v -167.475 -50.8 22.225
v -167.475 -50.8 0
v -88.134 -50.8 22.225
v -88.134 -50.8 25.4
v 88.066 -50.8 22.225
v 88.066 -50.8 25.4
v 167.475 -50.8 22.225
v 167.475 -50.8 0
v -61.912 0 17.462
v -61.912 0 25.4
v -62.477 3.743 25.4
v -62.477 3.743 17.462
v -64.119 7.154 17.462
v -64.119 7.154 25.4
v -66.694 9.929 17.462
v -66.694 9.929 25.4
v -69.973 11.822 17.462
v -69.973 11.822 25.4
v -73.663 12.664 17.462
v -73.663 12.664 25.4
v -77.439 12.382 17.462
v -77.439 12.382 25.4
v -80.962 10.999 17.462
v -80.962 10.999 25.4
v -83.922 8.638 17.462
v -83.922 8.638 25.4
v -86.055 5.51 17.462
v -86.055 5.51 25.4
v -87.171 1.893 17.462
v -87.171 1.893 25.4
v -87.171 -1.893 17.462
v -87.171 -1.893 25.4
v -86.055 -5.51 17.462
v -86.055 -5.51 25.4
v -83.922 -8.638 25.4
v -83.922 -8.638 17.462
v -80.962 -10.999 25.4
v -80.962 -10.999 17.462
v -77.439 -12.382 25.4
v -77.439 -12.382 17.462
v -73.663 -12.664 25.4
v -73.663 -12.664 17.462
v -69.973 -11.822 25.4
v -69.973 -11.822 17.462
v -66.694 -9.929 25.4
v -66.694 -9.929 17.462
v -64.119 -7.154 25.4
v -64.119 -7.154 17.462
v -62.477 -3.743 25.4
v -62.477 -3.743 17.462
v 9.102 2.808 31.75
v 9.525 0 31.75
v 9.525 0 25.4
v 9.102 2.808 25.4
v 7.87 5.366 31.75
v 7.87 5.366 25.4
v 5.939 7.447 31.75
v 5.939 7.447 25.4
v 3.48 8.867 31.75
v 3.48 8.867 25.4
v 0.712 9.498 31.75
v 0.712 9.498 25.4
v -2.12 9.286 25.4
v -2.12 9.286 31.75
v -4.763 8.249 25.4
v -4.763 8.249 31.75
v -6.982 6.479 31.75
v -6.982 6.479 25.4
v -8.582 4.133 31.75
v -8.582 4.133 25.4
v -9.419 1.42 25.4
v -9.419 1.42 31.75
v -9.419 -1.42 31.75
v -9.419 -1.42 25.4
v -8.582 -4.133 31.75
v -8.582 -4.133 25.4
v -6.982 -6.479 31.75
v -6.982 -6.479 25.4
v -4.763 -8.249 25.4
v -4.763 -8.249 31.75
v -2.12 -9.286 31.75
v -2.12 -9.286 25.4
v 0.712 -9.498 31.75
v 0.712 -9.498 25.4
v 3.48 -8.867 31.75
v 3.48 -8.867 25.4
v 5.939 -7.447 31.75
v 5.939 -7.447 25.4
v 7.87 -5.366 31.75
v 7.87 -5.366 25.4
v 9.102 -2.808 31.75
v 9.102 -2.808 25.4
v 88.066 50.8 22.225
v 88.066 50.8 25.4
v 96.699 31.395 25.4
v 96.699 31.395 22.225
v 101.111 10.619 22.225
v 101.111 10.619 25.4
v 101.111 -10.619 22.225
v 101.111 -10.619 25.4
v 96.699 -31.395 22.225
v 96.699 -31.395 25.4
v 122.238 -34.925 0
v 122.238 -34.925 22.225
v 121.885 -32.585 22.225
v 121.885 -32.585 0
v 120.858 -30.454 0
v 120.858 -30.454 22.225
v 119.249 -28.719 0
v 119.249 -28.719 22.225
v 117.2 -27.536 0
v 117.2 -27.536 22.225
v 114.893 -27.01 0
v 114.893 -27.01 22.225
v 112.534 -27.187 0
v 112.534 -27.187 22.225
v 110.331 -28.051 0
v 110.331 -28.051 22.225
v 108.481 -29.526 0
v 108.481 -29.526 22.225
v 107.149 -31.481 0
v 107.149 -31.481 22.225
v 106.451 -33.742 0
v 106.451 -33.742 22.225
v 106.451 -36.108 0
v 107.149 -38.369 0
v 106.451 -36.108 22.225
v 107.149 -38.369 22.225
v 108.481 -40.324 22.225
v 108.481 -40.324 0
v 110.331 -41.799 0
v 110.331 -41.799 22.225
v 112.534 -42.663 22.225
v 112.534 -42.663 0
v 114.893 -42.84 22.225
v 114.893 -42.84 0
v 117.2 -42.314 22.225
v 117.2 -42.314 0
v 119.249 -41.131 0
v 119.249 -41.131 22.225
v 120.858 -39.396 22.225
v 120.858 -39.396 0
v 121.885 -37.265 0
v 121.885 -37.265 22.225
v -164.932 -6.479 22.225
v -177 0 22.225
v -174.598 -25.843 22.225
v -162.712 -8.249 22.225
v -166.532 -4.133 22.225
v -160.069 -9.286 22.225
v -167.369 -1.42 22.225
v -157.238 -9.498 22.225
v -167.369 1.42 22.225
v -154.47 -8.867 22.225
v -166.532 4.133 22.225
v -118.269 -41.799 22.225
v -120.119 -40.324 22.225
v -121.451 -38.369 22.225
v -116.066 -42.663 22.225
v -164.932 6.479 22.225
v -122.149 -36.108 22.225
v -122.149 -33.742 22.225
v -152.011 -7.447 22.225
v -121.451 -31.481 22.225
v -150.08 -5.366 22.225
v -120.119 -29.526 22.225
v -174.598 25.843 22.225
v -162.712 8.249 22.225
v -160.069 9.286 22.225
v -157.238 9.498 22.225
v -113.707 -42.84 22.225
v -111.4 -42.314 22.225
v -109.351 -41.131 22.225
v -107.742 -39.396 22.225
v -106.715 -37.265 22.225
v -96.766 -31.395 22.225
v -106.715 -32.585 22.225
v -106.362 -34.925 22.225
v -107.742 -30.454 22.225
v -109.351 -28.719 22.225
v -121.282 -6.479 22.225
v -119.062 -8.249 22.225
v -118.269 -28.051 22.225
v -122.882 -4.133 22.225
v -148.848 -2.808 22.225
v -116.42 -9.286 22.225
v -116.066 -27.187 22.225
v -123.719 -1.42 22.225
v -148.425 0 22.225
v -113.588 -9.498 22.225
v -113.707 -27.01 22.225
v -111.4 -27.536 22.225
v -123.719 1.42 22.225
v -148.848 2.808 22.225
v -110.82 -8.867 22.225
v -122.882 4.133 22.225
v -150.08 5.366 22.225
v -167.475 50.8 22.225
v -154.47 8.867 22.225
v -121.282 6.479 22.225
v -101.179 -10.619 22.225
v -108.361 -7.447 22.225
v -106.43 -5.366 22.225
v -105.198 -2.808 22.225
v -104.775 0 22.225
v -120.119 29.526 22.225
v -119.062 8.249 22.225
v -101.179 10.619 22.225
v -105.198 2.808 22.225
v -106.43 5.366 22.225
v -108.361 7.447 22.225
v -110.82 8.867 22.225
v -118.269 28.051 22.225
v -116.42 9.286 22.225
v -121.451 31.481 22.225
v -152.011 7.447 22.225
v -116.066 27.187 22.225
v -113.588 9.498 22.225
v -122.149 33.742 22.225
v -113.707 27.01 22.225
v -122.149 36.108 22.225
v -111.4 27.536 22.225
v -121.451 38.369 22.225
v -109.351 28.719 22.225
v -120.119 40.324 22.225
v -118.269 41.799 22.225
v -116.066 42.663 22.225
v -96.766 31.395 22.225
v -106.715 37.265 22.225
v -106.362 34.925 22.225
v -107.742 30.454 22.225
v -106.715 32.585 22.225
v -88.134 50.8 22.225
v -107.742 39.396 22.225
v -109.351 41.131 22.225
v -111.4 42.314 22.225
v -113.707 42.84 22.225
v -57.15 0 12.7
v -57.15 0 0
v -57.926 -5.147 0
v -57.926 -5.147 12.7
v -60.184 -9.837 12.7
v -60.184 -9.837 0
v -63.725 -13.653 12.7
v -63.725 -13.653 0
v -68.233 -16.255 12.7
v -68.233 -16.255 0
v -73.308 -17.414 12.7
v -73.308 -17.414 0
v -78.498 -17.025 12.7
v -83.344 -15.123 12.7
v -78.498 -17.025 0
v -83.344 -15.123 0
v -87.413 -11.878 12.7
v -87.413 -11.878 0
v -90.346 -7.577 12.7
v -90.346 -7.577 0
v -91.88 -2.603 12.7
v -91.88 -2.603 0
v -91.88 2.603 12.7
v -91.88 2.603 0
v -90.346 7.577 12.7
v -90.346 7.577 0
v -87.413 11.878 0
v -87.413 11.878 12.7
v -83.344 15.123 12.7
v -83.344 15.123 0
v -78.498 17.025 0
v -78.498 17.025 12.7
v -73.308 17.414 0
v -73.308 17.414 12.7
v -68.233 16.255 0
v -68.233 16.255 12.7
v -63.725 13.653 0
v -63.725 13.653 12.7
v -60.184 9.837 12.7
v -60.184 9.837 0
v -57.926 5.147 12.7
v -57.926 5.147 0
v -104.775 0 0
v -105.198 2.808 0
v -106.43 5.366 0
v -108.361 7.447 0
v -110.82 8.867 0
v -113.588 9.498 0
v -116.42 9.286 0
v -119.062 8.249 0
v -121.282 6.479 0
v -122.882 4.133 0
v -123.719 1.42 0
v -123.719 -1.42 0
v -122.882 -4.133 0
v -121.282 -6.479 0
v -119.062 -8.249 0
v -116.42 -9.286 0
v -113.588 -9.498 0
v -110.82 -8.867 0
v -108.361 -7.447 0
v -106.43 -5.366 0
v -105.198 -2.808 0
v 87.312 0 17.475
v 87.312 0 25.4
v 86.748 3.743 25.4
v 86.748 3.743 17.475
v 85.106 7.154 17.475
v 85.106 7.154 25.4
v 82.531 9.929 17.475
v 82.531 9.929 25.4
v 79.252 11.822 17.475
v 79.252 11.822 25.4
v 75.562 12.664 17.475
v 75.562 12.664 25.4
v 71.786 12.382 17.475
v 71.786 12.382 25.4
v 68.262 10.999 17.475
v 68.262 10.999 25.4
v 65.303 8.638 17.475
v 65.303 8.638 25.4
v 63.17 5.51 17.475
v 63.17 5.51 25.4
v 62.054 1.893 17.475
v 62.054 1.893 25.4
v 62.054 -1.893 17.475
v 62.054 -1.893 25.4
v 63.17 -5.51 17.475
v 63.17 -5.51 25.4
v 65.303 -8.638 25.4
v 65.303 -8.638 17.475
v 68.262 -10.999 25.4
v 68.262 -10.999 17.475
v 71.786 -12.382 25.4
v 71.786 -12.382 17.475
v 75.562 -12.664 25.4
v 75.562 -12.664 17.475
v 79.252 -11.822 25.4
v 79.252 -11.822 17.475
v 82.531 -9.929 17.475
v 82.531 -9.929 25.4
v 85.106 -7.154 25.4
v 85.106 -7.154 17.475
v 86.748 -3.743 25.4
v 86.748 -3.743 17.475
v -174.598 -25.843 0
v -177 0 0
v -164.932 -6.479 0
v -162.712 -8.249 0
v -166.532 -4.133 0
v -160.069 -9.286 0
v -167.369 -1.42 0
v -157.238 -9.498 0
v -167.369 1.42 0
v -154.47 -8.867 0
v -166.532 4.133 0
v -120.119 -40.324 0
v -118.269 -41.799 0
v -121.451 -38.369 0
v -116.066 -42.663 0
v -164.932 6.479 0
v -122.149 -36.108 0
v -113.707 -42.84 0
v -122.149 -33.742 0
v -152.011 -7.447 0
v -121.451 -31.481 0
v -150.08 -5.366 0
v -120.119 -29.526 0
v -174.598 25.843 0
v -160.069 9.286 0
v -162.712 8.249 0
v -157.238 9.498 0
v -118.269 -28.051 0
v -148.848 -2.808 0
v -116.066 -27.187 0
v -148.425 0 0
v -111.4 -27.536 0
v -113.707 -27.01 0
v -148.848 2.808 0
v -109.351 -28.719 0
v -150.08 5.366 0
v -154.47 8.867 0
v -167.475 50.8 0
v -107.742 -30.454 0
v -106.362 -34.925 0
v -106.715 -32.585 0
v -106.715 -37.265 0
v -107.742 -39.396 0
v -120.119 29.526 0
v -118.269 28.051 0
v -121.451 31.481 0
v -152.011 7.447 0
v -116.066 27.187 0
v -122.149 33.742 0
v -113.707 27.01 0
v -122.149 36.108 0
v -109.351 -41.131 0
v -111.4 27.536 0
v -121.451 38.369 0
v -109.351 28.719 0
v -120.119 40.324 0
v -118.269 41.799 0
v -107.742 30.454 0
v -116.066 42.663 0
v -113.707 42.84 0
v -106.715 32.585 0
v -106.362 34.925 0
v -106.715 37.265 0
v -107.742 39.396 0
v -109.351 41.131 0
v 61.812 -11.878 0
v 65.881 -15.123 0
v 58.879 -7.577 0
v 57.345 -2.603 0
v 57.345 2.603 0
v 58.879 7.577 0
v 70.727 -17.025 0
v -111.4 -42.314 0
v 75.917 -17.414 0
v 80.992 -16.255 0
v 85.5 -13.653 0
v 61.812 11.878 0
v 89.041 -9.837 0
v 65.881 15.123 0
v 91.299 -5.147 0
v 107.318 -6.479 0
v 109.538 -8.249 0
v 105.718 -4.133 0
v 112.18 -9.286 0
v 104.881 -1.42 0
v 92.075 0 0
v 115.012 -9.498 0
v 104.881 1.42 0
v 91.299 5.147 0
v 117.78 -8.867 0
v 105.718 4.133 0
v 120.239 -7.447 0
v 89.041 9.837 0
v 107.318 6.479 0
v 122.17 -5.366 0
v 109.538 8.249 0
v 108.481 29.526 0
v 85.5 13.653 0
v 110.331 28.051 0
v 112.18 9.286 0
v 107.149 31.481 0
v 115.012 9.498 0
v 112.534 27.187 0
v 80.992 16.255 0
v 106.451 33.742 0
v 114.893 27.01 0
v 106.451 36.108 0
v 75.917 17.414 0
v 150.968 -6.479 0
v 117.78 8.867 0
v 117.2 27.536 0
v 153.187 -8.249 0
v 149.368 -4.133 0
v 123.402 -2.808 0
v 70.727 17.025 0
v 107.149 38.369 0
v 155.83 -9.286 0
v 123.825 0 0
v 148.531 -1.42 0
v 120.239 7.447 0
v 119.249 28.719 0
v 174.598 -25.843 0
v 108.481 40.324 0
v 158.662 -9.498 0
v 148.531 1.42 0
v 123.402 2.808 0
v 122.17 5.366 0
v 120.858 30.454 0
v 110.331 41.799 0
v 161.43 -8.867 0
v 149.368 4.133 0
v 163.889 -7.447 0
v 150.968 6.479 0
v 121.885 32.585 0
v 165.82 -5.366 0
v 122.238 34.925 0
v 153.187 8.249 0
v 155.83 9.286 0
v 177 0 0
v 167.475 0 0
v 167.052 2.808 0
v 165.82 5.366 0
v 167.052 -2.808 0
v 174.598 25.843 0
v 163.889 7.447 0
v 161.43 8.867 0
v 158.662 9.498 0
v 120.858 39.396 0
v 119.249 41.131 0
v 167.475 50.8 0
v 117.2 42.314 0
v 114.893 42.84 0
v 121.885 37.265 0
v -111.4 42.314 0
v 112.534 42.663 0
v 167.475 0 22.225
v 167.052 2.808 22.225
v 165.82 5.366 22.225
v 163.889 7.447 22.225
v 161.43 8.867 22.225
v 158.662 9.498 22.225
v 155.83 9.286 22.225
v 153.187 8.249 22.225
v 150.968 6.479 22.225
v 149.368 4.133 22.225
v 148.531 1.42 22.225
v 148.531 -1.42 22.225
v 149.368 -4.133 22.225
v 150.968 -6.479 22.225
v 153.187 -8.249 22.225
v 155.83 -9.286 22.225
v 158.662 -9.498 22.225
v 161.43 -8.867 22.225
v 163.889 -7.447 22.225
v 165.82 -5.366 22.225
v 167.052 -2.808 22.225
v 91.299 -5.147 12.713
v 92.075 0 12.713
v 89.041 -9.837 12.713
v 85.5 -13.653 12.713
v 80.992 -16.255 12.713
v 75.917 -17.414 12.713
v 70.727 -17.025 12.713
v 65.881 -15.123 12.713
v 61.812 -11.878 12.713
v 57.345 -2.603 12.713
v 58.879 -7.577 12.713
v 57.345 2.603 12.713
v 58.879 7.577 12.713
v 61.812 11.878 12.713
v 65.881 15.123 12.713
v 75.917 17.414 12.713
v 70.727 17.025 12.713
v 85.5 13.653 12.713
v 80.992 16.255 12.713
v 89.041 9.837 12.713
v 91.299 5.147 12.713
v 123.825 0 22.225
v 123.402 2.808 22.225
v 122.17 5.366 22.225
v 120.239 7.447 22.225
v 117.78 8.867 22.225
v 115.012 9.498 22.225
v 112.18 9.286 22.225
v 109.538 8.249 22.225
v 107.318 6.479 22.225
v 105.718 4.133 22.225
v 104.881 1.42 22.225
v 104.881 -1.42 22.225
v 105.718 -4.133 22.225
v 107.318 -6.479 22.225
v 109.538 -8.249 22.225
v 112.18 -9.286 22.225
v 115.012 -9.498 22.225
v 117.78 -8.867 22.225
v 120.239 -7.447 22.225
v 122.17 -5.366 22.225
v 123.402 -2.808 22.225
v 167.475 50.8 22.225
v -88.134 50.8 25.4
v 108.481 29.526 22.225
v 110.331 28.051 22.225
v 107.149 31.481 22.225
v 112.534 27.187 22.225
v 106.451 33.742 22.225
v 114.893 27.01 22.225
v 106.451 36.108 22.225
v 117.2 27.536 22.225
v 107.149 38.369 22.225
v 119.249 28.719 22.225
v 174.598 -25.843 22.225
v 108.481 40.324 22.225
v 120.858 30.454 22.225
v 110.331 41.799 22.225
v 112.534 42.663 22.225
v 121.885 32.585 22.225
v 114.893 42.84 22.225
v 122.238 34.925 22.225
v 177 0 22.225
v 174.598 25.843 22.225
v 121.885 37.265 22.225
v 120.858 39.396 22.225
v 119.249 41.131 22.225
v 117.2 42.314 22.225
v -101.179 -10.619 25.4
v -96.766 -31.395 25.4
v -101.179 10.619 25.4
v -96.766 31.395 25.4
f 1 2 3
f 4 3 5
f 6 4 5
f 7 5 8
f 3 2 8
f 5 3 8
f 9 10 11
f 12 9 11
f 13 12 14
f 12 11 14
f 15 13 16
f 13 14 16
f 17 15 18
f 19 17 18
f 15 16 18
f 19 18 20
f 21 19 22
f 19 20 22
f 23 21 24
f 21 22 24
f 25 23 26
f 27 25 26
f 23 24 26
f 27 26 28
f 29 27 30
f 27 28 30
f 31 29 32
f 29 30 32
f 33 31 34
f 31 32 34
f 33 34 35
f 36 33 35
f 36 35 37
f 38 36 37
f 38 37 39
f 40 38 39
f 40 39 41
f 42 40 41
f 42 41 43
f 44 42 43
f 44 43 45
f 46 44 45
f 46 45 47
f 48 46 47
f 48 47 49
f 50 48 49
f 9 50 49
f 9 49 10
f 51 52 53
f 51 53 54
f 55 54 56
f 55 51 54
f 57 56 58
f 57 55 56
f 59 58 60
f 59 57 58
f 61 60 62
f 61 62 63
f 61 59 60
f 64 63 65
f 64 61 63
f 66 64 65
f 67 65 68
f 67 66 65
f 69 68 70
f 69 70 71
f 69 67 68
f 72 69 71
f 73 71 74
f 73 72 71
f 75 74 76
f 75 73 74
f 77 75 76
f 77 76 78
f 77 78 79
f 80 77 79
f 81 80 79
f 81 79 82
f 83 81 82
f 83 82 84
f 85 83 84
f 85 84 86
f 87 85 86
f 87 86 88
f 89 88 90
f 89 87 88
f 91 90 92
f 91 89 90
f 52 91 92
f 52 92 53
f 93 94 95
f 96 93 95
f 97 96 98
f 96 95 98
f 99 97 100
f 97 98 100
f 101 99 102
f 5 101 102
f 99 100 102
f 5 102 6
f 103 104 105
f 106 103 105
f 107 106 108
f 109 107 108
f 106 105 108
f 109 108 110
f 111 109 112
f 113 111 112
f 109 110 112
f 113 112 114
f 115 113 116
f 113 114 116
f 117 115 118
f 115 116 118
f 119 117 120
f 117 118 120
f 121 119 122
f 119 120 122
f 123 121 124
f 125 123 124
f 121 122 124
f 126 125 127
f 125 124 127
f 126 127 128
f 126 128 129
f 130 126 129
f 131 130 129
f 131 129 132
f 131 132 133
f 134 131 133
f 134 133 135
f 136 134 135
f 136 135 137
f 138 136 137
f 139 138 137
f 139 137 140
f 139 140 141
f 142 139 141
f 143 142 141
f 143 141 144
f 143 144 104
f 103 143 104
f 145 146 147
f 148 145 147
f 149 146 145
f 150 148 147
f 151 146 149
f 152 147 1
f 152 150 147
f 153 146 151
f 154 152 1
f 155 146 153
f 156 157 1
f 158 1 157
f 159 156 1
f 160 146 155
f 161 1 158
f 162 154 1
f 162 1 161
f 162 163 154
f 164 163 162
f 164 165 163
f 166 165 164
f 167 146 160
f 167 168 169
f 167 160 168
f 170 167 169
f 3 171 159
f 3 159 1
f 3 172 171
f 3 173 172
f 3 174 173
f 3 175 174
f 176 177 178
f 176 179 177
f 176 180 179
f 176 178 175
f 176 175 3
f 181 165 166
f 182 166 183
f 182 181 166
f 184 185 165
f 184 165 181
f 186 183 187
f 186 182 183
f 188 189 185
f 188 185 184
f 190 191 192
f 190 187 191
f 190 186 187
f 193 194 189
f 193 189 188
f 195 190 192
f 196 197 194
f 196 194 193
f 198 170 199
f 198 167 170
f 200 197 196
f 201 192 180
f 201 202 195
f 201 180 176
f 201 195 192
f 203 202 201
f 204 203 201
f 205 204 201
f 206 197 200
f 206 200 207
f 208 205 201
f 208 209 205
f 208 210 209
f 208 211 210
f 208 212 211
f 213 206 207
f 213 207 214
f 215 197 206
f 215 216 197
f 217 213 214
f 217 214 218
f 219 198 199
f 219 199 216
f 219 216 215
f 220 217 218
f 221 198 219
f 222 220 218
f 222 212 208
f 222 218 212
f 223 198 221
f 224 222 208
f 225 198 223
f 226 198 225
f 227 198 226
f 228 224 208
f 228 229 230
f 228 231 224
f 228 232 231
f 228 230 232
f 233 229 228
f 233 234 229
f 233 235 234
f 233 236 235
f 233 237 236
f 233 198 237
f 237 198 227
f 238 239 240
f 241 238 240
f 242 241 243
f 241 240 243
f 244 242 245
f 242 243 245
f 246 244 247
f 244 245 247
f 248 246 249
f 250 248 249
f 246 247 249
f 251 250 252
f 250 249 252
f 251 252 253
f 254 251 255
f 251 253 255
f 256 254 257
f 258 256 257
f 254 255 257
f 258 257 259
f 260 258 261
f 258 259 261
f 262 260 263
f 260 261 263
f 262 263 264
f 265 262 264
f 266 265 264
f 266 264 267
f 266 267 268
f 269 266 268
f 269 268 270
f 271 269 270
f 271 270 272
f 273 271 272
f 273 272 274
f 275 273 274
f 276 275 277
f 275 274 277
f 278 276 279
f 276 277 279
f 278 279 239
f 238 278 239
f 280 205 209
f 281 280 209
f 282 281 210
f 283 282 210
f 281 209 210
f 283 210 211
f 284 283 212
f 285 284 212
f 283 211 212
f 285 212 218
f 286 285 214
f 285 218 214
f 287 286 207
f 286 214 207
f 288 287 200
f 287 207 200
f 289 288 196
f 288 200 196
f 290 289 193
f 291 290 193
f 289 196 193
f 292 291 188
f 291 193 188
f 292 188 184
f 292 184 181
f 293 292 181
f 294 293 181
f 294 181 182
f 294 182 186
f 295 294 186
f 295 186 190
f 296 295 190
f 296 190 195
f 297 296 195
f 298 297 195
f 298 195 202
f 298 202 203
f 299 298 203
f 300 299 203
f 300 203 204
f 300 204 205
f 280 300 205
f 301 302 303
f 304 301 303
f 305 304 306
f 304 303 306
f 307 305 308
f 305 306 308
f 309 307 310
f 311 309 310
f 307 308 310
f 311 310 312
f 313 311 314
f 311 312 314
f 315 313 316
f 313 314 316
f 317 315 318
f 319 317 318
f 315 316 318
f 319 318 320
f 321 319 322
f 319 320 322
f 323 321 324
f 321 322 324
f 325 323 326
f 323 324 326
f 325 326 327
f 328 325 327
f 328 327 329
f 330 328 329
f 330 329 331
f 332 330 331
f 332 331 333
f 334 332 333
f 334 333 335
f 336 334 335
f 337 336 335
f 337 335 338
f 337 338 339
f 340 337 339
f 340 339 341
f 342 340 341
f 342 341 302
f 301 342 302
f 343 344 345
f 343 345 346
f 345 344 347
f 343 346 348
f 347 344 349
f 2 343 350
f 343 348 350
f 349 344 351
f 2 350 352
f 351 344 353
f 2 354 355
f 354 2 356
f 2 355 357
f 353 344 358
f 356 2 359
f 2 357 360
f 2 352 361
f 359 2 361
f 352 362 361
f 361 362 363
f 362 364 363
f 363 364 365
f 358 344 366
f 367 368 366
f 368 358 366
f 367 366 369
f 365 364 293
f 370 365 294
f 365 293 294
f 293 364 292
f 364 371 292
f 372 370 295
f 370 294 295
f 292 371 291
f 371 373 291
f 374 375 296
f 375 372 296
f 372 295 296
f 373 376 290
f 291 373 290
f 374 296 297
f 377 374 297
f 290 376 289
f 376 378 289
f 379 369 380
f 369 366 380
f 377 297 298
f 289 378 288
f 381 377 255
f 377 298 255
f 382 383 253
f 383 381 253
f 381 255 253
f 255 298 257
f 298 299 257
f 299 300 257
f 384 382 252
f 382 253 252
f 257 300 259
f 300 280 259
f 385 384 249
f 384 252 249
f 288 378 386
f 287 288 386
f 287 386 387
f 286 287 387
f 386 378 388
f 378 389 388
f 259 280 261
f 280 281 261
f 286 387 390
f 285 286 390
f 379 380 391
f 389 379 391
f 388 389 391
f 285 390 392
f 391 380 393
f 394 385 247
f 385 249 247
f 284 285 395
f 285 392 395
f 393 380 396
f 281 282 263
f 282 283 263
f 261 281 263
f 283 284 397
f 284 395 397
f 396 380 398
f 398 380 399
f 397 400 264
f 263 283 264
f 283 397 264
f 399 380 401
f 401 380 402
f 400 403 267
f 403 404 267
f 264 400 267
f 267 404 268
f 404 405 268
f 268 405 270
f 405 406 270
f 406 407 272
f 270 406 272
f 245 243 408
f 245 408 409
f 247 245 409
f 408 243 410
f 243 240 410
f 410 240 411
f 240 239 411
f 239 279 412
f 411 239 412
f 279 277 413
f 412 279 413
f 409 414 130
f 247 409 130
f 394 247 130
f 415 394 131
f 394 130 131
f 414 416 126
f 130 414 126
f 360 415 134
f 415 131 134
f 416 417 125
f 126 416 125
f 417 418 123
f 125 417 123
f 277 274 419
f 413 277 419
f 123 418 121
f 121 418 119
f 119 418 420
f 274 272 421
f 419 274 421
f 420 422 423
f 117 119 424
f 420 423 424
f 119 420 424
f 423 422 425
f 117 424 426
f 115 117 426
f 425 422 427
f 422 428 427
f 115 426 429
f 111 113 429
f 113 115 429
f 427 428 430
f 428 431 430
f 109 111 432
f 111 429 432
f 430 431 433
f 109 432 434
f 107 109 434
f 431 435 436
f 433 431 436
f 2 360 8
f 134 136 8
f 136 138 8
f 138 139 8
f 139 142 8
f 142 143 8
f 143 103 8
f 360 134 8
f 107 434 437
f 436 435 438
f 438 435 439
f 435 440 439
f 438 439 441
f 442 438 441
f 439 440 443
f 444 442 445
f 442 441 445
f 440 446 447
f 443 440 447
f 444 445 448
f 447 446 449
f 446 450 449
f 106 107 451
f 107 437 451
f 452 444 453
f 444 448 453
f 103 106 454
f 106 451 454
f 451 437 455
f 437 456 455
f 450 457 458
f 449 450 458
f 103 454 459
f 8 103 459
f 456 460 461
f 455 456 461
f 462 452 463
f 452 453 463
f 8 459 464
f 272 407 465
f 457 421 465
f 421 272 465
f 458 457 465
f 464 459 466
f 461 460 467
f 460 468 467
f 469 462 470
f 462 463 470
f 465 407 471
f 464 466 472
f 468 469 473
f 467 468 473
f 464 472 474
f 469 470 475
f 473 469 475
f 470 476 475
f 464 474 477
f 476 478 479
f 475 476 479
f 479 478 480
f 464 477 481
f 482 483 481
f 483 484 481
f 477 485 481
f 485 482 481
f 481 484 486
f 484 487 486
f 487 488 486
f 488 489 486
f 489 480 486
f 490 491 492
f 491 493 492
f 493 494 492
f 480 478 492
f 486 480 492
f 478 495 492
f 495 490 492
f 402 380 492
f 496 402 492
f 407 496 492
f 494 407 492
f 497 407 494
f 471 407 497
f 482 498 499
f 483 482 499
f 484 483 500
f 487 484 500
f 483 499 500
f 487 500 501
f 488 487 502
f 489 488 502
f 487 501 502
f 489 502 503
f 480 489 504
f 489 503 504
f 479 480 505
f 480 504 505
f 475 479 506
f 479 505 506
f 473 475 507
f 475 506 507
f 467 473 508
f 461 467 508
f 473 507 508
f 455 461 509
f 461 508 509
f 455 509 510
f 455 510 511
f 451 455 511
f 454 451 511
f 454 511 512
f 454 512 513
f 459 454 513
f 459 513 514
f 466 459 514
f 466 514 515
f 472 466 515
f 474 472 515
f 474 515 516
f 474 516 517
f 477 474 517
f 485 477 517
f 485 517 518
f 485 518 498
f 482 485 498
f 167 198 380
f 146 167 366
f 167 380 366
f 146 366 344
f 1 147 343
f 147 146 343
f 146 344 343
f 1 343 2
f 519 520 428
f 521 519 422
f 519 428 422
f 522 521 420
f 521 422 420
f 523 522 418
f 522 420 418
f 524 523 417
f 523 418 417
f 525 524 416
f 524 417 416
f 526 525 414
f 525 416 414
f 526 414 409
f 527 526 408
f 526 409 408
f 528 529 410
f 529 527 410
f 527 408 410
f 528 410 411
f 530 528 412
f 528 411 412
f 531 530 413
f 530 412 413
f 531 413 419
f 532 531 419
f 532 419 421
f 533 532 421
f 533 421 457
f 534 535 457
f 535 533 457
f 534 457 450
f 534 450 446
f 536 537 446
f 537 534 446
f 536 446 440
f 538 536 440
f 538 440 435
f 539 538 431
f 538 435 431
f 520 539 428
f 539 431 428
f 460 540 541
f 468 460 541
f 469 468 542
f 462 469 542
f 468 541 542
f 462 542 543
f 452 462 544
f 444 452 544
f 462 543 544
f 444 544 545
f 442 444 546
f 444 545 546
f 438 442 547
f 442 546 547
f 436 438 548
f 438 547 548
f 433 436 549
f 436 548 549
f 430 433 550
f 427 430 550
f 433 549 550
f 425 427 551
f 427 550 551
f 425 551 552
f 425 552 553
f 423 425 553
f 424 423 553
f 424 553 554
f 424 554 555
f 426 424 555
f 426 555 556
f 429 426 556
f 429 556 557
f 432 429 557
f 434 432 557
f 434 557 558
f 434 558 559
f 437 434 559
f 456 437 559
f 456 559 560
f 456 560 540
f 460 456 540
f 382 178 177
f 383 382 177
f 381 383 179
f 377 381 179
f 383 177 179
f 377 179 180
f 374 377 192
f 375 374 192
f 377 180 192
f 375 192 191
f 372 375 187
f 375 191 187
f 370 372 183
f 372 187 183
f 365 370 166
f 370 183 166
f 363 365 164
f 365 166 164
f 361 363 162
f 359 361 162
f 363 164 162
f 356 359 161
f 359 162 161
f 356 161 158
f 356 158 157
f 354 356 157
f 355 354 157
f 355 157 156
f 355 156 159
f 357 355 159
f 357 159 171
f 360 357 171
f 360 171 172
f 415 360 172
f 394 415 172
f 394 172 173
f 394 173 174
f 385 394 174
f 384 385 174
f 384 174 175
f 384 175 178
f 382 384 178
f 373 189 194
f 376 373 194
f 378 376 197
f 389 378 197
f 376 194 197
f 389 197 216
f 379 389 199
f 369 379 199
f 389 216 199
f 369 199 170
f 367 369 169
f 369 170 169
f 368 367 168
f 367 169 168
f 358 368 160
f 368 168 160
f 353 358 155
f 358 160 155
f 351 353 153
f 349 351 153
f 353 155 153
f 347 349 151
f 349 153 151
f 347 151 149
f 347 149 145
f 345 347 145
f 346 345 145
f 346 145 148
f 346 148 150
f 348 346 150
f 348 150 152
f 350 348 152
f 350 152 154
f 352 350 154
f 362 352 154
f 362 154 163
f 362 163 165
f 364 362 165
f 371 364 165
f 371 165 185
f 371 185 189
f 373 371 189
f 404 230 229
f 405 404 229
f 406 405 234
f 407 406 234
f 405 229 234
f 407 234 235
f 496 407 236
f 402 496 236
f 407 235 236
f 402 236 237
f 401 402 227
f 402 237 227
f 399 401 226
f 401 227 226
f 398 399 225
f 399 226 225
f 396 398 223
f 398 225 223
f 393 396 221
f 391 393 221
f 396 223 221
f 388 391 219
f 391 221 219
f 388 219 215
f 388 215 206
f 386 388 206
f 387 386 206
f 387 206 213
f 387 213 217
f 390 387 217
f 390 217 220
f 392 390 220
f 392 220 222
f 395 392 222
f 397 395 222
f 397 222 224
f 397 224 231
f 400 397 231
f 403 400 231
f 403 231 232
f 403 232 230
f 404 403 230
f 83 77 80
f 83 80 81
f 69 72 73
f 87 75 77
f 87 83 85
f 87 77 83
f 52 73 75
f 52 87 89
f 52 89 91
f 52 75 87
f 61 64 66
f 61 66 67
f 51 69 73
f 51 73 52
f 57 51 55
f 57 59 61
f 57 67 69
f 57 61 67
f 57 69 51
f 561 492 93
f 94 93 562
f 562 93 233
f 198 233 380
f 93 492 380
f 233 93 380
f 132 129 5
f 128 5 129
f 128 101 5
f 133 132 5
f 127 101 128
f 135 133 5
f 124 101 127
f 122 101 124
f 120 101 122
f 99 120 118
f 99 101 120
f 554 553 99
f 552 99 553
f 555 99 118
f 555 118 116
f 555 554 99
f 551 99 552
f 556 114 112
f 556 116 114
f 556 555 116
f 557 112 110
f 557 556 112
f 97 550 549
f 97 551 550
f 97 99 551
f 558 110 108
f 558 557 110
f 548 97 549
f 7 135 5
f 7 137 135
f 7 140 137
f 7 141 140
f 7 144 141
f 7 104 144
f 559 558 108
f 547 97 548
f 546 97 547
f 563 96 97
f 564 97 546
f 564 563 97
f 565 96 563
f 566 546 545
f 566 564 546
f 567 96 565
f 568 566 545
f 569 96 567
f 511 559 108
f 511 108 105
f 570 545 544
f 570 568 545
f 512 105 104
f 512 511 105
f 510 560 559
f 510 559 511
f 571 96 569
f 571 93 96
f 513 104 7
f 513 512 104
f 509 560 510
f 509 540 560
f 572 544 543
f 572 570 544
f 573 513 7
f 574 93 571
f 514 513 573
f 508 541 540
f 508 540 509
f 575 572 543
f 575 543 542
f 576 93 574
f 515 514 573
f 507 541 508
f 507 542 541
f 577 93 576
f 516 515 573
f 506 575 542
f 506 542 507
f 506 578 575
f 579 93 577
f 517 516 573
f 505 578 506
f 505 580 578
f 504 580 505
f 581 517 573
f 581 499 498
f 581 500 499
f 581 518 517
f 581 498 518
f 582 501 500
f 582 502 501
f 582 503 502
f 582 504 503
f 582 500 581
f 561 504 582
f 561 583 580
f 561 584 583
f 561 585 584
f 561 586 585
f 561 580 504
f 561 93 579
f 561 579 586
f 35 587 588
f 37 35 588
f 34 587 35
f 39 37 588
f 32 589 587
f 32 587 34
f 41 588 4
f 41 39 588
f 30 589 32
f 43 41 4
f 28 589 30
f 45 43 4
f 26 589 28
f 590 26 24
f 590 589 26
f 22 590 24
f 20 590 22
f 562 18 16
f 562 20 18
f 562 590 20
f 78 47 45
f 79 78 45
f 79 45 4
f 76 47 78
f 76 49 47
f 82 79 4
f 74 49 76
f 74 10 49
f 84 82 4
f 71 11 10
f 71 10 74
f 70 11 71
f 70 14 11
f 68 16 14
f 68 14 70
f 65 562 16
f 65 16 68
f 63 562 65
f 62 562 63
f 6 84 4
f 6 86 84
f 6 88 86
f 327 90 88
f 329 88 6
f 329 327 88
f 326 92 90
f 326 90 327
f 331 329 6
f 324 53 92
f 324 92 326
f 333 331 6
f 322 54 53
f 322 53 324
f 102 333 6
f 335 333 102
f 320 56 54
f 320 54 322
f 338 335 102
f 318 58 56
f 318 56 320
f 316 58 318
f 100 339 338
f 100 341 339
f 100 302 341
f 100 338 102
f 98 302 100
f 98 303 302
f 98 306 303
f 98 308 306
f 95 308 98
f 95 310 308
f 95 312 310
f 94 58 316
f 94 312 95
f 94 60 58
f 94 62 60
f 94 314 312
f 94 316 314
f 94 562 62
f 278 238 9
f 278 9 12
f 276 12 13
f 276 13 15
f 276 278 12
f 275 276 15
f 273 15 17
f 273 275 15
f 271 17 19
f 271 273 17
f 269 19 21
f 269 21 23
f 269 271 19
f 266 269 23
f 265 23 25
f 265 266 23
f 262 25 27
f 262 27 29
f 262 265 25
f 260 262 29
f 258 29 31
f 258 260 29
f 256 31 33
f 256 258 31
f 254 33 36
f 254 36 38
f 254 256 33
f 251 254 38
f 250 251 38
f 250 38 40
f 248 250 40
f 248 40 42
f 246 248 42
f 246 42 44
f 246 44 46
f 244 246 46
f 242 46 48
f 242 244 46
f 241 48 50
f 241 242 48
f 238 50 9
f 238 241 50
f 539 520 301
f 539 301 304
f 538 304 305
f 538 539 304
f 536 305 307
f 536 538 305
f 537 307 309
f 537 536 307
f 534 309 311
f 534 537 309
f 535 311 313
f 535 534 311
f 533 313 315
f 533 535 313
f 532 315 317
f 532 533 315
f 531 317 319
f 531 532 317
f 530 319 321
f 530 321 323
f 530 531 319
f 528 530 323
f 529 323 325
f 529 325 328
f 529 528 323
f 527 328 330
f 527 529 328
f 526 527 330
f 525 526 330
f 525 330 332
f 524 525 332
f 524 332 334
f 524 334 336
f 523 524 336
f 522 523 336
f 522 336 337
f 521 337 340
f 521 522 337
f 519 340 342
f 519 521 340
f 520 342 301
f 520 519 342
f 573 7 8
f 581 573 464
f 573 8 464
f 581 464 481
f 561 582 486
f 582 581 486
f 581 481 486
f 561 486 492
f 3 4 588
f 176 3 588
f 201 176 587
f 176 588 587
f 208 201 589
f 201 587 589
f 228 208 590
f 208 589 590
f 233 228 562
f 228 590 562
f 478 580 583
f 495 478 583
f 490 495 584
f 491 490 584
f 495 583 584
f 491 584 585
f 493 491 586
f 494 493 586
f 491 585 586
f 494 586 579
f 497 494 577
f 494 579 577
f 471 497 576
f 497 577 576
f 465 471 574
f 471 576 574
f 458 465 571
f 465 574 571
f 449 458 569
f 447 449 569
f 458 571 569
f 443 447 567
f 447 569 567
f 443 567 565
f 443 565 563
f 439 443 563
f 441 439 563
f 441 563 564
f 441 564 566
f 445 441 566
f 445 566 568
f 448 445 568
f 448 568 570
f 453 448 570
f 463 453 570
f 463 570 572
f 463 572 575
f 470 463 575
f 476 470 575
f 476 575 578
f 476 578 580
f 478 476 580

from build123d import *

# Parameters (mm, degrees)
F1_DEPTH     = 31.75
F2_W         = 377.4263709784
F2_H         = 129.2024739087
F2_R         = 9.525
F3_DEPTH     = 6.35
F4_W         = 382.6104104519
F4_H         = 158.9530184865
F5_DEPTH     = 3.175
F6_R         = 12.7
F6_R_2       = 9.525
F6_R_3       = 7.9375
F7_DEPTH     = 25.4
F8_R         = 17.4625
F9_DEPTH     = 12.7
F10_S5_R     = 17.4625
F10_T6_DEPTH = 26
F11_SIZE     = 4.76249


# Not quite as in the source:
# - a fillet or chamfer that OpenCascade refuses, or shapes differently, is made with other operations: its cross-section is extruded or revolved along the edge and cut away or added
# - a fillet or chamfer is up to 0.001 mm smaller than in the source, because OpenCascade refuses the exact size


with BuildPart() as f1:
    # F0 (on Top) → F1 (new body)
    with BuildSketch(Plane.XY):
        with BuildLine():
            Line((167.4749, 50.8), (-167.4749, 50.8))
            ThreePointArc((-167.4749, 50.8), (-176.9999, 0), (-167.4749, -50.8))
            Line((-167.4749, -50.8), (167.4749, -50.8))
            ThreePointArc((167.4749, -50.8), (176.9999, 0), (167.4749, 50.8))
        make_face()
    extrude(amount=F1_DEPTH)

    # F2 (on face) → F3 (cut)
    with BuildSketch(Plane.XY.offset(31.75)):
        with Locations((2.5683268905, -4.8314835876)):
            Rectangle(F2_W, F2_H)
        Circle(F2_R, mode=Mode.SUBTRACT)
    extrude(amount=-F3_DEPTH, mode=Mode.SUBTRACT)

    # F4 (on face) → F5 (cut)
    with BuildSketch(Plane.XY.offset(25.4)):
        with Locations((2.3195892572, -0.8801557124)):
            Rectangle(F4_W, F4_H)
        with BuildLine():
            Line((-167.4749, 50.8), (-88.1336606718, 50.8))
            Line((-88.1336606718, 50.8), (88.0661393282, 50.8))
            Line((88.0661393282, 50.8), (167.4749, 50.8))
            ThreePointArc((167.4749, 50.8), (176.9999, 0), (167.4749, -50.8))
            Line((167.4749, -50.8), (88.0661393282, -50.8))
            Line((88.0661393282, -50.8), (-88.1336606718, -50.8))
            Line((-88.1336606718, -50.8), (-167.4749, -50.8))
            ThreePointArc((-167.4749, -50.8), (-176.9999, 0), (-167.4749, 50.8))
        make_face(mode=Mode.SUBTRACT)
        with BuildLine():
            Line((167.4749, 50.8), (88.0661393282, 50.8))
            ThreePointArc((88.0661393282, 50.8), (101.6675213437, 0), (88.0661393282, -50.8))
            Line((88.0661393282, -50.8), (167.4749, -50.8))
            ThreePointArc((167.4749, -50.8), (176.9999, 0), (167.4749, 50.8))
        make_face()
        with BuildLine():
            ThreePointArc((-88.1336606718, -50.8), (-101.7350426874, 0), (-88.1336606718, 50.8))
            Line((-88.1336606718, 50.8), (-167.4749, 50.8))
            ThreePointArc((-167.4749, 50.8), (-176.9999, 0), (-167.4749, -50.8))
            Line((-167.4749, -50.8), (-88.1336606718, -50.8))
        make_face()
    extrude(amount=-F5_DEPTH, mode=Mode.SUBTRACT)

    # F6 (on face) → F7 (cut)
    with BuildSketch(Plane.XY.offset(25.4)):
        with Locations((-74.6125, 0)):
            Circle(F6_R)
        with Locations((74.6125, 0)):
            Circle(F6_R)
        with Locations((114.3, 0)):
            Circle(F6_R_2)
        with Locations((157.9499, 0)):
            Circle(F6_R_2)
        with Locations((-114.3, 0)):
            Circle(F6_R_2)
        with Locations((-157.9499, 0)):
            Circle(F6_R_2)
        with Locations((-114.3, 34.925)):
            Circle(F6_R_3)
        with Locations((-114.3, -34.925)):
            Circle(F6_R_3)
        with Locations((114.3, 34.925)):
            Circle(F6_R_3)
        with Locations((114.3, -34.925)):
            Circle(F6_R_3)
    extrude(amount=-F7_DEPTH, mode=Mode.SUBTRACT)

    # F8 (on face) → F9 (cut)
    with BuildSketch(Plane(origin=(0, 0, 0), x_dir=(1, 0, 0), z_dir=(0, 0, -1))):
        with Locations((-74.6125, 0)):
            Circle(F8_R)
        with Locations((74.6125, 0)):
            Circle(F8_R)
    extrude(amount=-F9_DEPTH, mode=Mode.SUBTRACT)

    # F10: chamfer of 4.7752 on 1 edges, made by hand


with BuildPart() as f10_tool2:
    # F10_s3 → F10_t4 (revolve)
    with BuildSketch(Plane.XZ):
        Polygon((87.3125, 17.4752), (92.0877, 12.7), (87.3125, 12.7), align=None)
    revolve(axis=Axis((74.6125, 0, 12.7), (0, 0, 1)))

    # F10_s5 → F10_t6 (intersect, symmetric)
    with BuildSketch(Plane.XY.offset(15.1)):
        with Locations((74.6125, 0)):
            Circle(F10_S5_R)
    extrude(amount=F10_T6_DEPTH, both=True, mode=Mode.INTERSECT)


with BuildPart() as f1_1:
    add(f1.part)

    # F10_t1: cut F10_tool2
    add(f10_tool2.part, mode=Mode.SUBTRACT)

    # F11 (size 4.7625 in the source; OpenCascade refuses exactly that, so slightly less here)
    f11_edges = [f1_1.edges().sort_by_distance(p)[0] for p in [
        (-87.3125, 0, 12.7),
    ]]
    chamfer(f11_edges, length=F11_SIZE)


solid = f1_1.part
